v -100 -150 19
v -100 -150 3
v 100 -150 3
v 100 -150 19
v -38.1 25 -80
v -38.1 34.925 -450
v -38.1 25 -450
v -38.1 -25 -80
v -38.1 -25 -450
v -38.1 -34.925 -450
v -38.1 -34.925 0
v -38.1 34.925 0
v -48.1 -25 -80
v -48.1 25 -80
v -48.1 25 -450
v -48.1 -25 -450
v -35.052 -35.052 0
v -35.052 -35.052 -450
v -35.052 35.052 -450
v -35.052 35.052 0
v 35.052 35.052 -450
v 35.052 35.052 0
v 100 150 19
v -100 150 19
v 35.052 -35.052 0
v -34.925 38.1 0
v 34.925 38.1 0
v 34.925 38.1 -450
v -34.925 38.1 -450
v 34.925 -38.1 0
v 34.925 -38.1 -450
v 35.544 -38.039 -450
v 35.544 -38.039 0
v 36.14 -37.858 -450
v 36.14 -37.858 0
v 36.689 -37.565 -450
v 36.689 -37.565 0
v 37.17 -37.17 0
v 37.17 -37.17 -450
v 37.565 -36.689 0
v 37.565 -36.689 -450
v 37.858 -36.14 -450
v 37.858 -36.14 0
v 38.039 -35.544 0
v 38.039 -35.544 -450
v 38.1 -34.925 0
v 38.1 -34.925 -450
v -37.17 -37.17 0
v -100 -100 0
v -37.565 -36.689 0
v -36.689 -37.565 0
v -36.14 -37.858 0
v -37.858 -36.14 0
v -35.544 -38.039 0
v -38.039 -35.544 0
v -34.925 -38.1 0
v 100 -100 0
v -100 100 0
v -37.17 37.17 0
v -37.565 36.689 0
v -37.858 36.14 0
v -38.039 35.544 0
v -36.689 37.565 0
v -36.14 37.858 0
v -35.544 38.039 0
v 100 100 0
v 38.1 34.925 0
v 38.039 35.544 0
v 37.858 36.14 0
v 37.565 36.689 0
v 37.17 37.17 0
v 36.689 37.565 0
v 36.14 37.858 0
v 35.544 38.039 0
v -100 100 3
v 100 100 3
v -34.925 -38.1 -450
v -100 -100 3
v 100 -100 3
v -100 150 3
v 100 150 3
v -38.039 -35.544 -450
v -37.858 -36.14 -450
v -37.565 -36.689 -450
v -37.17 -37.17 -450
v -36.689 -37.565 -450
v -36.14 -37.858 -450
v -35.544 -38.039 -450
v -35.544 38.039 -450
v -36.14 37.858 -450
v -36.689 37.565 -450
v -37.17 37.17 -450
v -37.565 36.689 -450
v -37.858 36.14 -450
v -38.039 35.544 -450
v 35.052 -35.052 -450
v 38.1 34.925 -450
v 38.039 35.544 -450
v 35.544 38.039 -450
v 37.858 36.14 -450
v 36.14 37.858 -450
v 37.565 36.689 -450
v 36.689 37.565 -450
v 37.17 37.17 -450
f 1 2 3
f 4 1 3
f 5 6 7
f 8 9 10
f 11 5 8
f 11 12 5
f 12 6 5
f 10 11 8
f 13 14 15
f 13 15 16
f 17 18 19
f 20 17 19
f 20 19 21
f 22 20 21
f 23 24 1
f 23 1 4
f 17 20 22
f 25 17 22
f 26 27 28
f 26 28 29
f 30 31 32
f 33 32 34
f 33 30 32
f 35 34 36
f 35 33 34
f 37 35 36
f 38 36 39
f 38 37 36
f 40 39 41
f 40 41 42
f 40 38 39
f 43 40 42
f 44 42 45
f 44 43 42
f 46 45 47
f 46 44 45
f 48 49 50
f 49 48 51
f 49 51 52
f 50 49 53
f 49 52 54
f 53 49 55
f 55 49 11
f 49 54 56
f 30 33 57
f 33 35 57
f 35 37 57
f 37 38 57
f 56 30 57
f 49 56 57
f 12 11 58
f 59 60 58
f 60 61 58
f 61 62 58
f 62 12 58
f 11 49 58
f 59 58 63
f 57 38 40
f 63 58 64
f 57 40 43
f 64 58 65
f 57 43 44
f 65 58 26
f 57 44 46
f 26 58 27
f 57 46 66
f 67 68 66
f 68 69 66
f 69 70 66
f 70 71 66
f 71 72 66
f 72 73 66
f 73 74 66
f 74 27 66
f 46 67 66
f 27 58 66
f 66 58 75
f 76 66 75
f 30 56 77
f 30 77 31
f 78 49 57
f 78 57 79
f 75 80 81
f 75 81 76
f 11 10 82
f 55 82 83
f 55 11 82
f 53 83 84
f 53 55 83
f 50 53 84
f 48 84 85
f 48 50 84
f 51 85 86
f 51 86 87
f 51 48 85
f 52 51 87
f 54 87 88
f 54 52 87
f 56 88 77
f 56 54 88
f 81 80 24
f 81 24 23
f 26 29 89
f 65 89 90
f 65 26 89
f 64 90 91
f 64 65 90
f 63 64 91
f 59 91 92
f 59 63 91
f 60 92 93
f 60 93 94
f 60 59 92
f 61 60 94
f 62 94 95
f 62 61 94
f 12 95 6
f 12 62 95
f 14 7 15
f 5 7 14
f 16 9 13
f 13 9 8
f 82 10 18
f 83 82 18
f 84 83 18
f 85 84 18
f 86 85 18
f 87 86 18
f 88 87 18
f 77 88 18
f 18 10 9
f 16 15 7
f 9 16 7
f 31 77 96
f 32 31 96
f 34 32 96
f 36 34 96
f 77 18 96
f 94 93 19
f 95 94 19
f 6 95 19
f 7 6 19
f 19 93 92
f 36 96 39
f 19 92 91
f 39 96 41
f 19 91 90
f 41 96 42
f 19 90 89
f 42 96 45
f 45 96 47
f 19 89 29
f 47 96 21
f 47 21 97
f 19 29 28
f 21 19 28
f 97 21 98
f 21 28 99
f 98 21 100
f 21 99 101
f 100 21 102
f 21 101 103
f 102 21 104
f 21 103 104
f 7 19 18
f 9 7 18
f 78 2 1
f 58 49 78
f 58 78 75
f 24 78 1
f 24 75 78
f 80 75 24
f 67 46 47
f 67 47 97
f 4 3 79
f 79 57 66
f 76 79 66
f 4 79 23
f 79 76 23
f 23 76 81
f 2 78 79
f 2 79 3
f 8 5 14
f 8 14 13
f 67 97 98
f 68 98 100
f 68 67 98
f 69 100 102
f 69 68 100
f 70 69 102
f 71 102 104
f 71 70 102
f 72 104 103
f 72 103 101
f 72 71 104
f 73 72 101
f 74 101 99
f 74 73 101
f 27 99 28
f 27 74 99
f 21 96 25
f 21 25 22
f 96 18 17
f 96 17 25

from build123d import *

# Parameters (mm, degrees)
F0_W     = 70.104
F0_H     = 70.104
F1_DEPTH = 450
F2_W     = 50
F2_H     = 370
F3_DEPTH = 10
F4_W     = 200
F4_H     = 300
F5_DEPTH = 19
F6_W     = 50
F6_H     = 3
F7_DEPTH = 254


with BuildPart() as f1:
    # F0 (on Top) → F1 (new body)
    with BuildSketch(Plane.XY):
        with BuildLine():
            Line((34.925, 38.1), (-34.925, 38.1))
            ThreePointArc((-34.925, 38.1), (-37.1700640303, 37.1700640303), (-38.1, 34.925))
            Line((-38.1, 34.925), (-38.1, -34.925))
            ThreePointArc((-38.1, -34.925), (-37.1700640303, -37.1700640303), (-34.925, -38.1))
            Line((-34.925, -38.1), (34.925, -38.1))
            ThreePointArc((34.925, -38.1), (37.1700640303, -37.1700640303), (38.1, -34.925))
            Line((38.1, -34.925), (38.1, 34.925))
            ThreePointArc((38.1, 34.925), (37.1700640303, 37.1700640303), (34.925, 38.1))
        make_face()
        Rectangle(F0_W, F0_H, mode=Mode.SUBTRACT)
    extrude(amount=-F1_DEPTH)

    # F2 (on face) → F3 (join)
    with BuildSketch(Plane(origin=(-38.1, 0, 0), x_dir=(0, -1, 0), z_dir=(-1, 0, 0))):
        with Locations((0, -265)):
            Rectangle(F2_W, F2_H)
    extrude(amount=F3_DEPTH)

    # F4 (on Top) → F5 (join)
    with BuildSketch(Plane.XY):
        Rectangle(F4_W, F4_H)
    extrude(amount=F5_DEPTH)

    # F6 (on face) → F7 (cut)
    with BuildSketch(Plane(origin=(-100, 0, 0), x_dir=(0, -1, 0), z_dir=(-1, 0, 0))):
        with Locations((125, 1.5)):
            Rectangle(F6_W, F6_H)
        with Locations((-125, 1.5)):
            Rectangle(F6_W, F6_H)
    extrude(amount=-F7_DEPTH, mode=Mode.SUBTRACT)


solid = f1.part
